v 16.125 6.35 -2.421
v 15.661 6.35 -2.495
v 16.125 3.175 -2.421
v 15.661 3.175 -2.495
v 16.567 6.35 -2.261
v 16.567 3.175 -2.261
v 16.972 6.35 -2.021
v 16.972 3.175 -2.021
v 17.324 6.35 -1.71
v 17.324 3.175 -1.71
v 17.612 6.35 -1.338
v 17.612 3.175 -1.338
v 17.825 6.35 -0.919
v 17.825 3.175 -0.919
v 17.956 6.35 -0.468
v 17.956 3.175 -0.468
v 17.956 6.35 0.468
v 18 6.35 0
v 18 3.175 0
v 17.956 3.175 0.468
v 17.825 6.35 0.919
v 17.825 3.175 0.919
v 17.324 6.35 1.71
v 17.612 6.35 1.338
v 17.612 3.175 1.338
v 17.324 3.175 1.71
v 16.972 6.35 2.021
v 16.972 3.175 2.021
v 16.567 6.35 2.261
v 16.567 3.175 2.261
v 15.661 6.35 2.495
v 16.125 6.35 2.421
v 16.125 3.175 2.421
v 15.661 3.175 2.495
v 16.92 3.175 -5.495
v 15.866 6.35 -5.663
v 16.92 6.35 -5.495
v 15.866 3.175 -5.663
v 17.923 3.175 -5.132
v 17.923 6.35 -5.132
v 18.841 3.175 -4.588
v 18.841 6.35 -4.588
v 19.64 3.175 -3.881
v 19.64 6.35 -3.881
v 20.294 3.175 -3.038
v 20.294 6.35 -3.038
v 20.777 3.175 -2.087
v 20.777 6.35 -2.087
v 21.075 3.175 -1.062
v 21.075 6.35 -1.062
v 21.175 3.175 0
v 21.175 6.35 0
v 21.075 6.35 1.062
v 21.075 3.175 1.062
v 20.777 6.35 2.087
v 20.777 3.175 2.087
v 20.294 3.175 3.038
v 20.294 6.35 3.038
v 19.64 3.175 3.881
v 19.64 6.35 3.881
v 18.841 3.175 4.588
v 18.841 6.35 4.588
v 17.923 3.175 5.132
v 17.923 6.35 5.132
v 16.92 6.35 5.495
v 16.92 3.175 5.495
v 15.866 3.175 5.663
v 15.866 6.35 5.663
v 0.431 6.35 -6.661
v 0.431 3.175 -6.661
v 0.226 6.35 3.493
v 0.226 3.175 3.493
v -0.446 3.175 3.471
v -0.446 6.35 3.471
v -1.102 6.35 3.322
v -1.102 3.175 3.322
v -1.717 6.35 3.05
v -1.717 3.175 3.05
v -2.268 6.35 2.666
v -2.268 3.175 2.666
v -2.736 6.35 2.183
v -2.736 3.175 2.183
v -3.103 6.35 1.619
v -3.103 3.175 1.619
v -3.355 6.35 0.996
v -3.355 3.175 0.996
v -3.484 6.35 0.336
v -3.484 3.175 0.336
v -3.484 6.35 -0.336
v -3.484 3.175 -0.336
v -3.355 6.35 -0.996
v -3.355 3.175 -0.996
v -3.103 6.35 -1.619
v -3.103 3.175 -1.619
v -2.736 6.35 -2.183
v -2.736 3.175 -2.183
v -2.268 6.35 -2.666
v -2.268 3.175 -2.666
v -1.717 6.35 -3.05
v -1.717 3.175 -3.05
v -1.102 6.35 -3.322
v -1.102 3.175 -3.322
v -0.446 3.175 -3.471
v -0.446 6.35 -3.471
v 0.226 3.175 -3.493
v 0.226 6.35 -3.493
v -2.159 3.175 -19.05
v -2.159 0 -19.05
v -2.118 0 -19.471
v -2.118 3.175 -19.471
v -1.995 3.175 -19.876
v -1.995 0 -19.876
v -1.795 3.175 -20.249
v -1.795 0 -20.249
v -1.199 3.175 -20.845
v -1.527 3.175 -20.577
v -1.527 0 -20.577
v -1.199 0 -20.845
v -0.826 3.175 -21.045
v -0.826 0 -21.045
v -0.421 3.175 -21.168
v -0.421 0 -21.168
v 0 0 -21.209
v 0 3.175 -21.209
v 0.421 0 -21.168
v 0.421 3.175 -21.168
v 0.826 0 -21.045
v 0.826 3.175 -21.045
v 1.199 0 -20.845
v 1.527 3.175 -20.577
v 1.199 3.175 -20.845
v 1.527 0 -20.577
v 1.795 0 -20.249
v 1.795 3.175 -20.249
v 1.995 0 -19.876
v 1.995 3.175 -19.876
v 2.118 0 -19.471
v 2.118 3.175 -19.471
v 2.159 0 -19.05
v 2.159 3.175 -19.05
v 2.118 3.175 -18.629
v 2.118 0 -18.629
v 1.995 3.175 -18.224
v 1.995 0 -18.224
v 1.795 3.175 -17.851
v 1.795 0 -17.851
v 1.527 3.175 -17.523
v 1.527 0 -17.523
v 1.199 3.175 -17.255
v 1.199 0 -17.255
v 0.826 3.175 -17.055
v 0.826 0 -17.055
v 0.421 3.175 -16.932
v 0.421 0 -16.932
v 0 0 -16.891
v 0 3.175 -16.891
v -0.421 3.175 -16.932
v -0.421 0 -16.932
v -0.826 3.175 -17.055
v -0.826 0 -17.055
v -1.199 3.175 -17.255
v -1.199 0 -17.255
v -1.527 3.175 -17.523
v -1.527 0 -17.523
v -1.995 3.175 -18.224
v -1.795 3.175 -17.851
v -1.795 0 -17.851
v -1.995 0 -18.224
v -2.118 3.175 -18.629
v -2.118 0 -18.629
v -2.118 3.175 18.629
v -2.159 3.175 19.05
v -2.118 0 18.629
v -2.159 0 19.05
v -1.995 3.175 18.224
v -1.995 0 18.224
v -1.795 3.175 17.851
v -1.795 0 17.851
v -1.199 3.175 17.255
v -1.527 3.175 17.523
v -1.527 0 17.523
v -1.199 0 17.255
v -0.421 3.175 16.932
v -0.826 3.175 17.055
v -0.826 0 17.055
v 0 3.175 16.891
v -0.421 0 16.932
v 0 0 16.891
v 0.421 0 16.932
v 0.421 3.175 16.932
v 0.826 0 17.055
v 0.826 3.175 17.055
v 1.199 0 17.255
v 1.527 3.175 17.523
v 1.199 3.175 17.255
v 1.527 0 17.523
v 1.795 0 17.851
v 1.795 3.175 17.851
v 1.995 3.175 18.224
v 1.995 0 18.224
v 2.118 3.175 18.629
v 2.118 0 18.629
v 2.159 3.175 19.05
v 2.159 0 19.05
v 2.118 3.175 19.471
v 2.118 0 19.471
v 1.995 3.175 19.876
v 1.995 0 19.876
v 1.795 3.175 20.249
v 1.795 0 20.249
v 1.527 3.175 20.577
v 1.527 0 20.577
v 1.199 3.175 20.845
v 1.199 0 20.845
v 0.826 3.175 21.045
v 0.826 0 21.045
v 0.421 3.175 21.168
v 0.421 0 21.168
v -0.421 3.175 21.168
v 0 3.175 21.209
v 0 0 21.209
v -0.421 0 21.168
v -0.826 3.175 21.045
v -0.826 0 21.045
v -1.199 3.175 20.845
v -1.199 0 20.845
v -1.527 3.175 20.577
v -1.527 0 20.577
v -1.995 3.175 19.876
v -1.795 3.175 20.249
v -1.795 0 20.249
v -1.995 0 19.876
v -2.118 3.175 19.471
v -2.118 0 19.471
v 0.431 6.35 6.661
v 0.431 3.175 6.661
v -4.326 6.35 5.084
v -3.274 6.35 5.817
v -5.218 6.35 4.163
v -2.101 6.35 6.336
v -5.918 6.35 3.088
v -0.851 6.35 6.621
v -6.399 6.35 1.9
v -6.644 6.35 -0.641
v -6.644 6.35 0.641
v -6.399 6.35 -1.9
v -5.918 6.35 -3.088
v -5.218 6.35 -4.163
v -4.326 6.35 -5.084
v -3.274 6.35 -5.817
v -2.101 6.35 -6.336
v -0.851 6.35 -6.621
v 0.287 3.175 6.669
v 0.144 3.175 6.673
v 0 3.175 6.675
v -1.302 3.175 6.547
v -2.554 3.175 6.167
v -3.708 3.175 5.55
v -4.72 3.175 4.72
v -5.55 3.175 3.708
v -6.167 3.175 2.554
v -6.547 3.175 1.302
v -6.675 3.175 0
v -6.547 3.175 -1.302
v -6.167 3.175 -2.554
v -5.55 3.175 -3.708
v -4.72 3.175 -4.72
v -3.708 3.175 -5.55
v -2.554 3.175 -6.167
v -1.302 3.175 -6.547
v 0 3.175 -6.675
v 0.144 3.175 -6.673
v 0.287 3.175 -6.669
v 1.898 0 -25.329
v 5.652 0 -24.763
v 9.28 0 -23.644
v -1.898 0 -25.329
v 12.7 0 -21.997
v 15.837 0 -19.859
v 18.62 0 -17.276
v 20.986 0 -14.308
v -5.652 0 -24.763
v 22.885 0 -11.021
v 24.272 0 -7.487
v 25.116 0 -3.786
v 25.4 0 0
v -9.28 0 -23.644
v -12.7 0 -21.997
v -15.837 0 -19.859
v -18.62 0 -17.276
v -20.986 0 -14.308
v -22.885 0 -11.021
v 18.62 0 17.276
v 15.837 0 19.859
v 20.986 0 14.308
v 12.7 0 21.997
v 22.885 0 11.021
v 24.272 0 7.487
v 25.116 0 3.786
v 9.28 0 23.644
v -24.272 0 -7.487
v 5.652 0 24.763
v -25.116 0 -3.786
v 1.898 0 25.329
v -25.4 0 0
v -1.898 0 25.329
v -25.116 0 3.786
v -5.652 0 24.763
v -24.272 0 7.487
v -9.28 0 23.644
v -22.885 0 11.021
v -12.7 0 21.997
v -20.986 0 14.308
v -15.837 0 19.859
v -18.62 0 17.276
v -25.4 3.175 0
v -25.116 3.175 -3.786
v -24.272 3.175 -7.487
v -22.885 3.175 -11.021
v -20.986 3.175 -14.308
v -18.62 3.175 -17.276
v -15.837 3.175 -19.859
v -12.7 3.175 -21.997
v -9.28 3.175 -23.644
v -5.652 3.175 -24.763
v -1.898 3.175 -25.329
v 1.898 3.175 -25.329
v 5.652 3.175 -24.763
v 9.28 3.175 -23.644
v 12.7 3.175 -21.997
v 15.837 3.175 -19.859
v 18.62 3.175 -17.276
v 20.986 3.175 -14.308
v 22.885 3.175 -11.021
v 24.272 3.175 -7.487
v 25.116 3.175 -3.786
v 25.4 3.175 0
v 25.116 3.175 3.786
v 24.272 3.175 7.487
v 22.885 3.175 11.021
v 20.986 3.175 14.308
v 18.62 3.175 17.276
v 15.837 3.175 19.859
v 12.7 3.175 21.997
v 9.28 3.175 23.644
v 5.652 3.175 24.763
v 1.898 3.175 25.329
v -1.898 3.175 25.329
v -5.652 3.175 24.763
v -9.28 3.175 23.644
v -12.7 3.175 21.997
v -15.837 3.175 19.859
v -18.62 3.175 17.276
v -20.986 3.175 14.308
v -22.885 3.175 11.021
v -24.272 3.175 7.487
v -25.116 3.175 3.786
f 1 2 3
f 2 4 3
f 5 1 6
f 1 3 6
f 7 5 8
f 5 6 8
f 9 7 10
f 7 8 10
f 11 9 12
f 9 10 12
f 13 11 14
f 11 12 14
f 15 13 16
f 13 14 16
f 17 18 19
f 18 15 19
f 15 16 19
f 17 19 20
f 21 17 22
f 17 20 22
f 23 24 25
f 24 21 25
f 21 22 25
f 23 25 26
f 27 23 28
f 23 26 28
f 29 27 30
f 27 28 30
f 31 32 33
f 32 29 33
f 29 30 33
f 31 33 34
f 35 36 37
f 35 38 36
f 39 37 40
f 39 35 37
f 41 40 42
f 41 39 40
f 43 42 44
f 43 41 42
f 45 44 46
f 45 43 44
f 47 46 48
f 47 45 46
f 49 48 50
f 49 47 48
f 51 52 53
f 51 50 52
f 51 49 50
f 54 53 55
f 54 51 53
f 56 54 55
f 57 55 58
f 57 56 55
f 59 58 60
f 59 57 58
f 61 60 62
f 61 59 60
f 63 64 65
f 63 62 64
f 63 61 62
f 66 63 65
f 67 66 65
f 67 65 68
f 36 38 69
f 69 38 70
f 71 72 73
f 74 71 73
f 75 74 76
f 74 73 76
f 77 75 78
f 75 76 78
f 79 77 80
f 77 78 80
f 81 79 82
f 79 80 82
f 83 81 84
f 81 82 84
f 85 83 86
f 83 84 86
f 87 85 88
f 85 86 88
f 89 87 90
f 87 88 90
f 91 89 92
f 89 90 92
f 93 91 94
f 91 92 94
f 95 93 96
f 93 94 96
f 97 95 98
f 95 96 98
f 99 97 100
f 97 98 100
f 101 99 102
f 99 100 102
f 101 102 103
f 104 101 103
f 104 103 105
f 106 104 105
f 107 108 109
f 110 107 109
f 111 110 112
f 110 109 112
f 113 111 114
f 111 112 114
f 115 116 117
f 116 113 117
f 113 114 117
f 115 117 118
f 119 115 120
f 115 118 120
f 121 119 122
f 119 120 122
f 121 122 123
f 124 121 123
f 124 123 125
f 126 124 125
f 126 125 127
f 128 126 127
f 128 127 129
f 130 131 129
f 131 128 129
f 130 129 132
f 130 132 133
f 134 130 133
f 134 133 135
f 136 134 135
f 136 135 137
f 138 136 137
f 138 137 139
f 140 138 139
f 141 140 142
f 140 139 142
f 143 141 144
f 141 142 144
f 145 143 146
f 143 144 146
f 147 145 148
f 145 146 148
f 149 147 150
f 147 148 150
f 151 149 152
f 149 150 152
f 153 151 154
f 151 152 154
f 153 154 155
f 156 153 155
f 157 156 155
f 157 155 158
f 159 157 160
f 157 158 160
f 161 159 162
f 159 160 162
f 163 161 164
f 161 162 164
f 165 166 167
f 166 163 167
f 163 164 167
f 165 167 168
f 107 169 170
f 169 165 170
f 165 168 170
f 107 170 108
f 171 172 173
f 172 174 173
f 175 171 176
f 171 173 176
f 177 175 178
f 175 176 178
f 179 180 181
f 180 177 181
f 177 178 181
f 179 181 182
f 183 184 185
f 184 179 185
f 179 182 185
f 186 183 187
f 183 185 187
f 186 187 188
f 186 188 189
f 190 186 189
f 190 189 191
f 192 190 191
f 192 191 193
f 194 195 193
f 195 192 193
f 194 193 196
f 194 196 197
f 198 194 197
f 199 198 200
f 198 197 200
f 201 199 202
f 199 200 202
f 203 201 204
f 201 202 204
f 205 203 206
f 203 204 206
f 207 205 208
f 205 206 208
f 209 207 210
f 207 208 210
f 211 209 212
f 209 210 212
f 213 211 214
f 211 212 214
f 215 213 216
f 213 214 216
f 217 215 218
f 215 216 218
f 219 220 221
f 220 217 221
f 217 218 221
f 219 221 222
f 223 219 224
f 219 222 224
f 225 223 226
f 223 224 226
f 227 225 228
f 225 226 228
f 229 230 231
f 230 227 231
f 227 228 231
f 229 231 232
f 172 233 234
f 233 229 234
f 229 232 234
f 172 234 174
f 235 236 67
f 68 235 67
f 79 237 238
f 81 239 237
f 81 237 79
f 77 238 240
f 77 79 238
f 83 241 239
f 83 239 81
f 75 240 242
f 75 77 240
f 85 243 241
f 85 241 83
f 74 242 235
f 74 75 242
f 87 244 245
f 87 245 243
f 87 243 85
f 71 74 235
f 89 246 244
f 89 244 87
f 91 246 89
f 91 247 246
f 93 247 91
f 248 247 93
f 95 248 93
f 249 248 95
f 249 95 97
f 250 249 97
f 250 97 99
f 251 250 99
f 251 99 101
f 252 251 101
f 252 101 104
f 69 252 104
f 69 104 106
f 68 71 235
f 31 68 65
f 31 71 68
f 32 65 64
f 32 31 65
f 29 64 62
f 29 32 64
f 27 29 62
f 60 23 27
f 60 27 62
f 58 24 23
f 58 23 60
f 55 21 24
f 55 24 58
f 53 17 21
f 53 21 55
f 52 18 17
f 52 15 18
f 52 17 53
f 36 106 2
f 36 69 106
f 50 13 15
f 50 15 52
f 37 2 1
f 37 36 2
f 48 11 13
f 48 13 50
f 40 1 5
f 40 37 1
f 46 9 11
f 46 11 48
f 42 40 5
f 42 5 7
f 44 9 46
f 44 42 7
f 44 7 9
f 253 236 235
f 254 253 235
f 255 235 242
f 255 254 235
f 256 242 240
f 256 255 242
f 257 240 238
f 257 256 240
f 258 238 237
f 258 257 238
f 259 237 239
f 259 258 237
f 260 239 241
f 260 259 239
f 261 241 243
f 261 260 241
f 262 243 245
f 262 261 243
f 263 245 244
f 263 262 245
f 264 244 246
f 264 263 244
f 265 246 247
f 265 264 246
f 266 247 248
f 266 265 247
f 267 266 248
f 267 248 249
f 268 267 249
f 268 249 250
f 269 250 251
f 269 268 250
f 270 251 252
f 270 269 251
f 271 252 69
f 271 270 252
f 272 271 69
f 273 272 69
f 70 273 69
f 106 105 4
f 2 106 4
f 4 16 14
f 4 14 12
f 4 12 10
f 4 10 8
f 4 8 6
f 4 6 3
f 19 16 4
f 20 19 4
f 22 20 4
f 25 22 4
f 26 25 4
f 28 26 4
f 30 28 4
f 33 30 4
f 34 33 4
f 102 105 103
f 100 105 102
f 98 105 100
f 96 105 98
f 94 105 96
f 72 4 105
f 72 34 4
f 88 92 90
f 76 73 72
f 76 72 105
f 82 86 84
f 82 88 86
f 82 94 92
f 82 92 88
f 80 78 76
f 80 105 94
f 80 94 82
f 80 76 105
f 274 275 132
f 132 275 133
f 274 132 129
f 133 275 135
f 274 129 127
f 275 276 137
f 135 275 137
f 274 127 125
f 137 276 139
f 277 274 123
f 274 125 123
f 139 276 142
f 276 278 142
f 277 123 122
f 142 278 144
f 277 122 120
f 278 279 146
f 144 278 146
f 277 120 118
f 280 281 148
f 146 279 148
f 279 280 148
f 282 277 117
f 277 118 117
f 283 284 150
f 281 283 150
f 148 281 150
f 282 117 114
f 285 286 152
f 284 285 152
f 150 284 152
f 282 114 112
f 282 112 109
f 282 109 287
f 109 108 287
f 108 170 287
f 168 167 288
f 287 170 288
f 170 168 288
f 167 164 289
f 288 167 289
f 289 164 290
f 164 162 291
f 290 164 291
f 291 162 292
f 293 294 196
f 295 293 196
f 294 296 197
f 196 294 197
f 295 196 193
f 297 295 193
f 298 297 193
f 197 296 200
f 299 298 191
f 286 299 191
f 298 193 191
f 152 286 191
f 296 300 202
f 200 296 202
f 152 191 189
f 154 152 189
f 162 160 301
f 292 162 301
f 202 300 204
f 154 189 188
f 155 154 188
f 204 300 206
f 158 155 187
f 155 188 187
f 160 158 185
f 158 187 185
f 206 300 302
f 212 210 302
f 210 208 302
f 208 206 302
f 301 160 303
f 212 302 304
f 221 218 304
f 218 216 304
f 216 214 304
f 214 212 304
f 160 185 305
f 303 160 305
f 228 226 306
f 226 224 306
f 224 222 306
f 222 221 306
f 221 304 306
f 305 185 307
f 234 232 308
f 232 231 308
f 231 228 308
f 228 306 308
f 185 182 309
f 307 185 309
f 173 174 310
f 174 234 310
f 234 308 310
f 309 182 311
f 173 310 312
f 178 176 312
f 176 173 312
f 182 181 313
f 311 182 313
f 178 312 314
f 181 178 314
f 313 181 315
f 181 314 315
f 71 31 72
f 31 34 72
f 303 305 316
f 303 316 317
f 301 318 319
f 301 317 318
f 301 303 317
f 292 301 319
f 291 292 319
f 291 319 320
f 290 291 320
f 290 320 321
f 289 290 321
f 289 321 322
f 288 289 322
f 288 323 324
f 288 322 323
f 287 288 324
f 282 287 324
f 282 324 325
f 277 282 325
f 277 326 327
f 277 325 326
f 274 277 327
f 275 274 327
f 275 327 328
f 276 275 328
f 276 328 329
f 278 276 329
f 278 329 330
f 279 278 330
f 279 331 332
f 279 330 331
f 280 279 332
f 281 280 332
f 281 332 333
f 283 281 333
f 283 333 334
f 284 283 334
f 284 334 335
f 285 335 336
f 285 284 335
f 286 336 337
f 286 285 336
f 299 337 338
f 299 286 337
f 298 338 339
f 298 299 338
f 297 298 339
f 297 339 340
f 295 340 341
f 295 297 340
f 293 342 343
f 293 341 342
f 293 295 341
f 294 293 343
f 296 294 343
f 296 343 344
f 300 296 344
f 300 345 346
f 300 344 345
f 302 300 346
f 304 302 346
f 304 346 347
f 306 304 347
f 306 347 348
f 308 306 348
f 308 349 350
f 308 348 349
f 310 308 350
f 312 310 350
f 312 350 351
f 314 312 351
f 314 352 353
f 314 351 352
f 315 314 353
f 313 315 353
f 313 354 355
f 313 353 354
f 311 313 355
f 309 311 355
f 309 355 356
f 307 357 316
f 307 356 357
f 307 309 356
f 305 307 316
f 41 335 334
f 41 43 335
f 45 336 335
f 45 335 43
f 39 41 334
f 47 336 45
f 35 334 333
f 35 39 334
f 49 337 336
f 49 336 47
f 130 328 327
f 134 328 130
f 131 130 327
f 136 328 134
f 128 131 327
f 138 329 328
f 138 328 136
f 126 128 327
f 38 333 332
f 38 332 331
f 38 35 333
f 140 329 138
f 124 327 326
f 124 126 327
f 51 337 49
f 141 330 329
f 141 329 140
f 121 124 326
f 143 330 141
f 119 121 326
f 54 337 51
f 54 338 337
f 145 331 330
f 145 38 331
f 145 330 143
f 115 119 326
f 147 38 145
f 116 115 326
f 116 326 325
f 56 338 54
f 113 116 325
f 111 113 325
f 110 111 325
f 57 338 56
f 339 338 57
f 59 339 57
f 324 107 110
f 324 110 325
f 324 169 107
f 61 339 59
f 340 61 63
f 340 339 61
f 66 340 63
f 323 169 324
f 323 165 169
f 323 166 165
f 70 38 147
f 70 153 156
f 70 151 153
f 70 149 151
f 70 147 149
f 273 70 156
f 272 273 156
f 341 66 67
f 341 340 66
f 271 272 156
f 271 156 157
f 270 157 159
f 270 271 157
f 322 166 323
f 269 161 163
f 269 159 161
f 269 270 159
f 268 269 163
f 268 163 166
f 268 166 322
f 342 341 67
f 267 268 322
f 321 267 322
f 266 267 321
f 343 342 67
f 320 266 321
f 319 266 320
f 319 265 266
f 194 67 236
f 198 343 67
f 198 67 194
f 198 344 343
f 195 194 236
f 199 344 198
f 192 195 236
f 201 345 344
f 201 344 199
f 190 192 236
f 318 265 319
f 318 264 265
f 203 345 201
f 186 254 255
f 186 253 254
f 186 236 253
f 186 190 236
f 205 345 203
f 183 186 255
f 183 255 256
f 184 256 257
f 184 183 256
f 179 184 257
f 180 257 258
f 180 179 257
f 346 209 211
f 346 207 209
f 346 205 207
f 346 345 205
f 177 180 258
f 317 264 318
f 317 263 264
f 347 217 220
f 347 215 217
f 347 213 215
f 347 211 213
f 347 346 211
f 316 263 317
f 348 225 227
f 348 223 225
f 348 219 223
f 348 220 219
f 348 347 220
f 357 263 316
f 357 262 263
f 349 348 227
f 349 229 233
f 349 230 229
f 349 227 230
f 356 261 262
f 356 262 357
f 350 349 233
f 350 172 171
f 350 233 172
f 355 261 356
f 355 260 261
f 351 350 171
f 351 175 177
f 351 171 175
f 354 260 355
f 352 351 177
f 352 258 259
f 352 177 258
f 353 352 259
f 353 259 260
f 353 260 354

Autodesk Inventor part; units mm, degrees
ref_plane "YZ Plane" through (0, 0, 0) normal (1, 0, 0) x (0, 1, 0)
ref_plane "XZ Plane" through (0, 0, 0) normal (0, 1, 0) x (-1, 0, 0)
ref_plane "XY Plane" through (0, 0, 0) normal (0, 0, 1) x (1, 0, 0)
sketch "Sketch1" plane through (0, 0, 0) normal (0, 1, 0) x (-1, 0, 0)
  circle A0 centre (0, 0) radius 25.4
  circle A1 centre (0, -19.05) radius 2.159
  circle A2 centre (0, 19.05) radius 2.159
  line L0 (0, 19.05) -> (0, -19.05)
  dimension "d0" = 50.8
  dimension "d1" = 4.318
  dimension "d2" = 4.318
  dimension "d3" = 38.1
extrude "Extrusion1" add sketch "Sketch1" along normal blind 3.175
sketch "Sketch2" plane through (0, 3.175, 0) normal (0, 1, 0) x (1, 0, 0)
  arc A0 (0.2258, 3.4927) -> (0.2258, -3.4927) centre (0, 0) ccw
  arc A1 (15.6613, -2.4948) -> (15.6613, 2.4948) centre (15.5, 0) ccw
  line L0 (0.2258, 3.4927) -> (15.6613, 2.4948)
  line L1 (15.6613, -2.4948) -> (0.2258, -3.4927)
  line L2 (15.8661, 5.6632) -> (0.4306, 6.6611)
  arc A2 (0.4306, 6.6611) -> (0.4306, -6.6611) centre (0, 0) ccw
  line L3 (0.4306, -6.6611) -> (15.8661, -5.6632)
  arc A3 (15.8661, -5.6632) -> (15.8661, 5.6632) centre (15.5, 0) ccw
  dimension "d6" = 7
  dimension "d7" = 5
  dimension "d8" = 21.5
  dimension "d9" = 3.175
extrude "Extrusion2" add sketch "Sketch2" along normal blind 3.175
properties part number "Thingy"
